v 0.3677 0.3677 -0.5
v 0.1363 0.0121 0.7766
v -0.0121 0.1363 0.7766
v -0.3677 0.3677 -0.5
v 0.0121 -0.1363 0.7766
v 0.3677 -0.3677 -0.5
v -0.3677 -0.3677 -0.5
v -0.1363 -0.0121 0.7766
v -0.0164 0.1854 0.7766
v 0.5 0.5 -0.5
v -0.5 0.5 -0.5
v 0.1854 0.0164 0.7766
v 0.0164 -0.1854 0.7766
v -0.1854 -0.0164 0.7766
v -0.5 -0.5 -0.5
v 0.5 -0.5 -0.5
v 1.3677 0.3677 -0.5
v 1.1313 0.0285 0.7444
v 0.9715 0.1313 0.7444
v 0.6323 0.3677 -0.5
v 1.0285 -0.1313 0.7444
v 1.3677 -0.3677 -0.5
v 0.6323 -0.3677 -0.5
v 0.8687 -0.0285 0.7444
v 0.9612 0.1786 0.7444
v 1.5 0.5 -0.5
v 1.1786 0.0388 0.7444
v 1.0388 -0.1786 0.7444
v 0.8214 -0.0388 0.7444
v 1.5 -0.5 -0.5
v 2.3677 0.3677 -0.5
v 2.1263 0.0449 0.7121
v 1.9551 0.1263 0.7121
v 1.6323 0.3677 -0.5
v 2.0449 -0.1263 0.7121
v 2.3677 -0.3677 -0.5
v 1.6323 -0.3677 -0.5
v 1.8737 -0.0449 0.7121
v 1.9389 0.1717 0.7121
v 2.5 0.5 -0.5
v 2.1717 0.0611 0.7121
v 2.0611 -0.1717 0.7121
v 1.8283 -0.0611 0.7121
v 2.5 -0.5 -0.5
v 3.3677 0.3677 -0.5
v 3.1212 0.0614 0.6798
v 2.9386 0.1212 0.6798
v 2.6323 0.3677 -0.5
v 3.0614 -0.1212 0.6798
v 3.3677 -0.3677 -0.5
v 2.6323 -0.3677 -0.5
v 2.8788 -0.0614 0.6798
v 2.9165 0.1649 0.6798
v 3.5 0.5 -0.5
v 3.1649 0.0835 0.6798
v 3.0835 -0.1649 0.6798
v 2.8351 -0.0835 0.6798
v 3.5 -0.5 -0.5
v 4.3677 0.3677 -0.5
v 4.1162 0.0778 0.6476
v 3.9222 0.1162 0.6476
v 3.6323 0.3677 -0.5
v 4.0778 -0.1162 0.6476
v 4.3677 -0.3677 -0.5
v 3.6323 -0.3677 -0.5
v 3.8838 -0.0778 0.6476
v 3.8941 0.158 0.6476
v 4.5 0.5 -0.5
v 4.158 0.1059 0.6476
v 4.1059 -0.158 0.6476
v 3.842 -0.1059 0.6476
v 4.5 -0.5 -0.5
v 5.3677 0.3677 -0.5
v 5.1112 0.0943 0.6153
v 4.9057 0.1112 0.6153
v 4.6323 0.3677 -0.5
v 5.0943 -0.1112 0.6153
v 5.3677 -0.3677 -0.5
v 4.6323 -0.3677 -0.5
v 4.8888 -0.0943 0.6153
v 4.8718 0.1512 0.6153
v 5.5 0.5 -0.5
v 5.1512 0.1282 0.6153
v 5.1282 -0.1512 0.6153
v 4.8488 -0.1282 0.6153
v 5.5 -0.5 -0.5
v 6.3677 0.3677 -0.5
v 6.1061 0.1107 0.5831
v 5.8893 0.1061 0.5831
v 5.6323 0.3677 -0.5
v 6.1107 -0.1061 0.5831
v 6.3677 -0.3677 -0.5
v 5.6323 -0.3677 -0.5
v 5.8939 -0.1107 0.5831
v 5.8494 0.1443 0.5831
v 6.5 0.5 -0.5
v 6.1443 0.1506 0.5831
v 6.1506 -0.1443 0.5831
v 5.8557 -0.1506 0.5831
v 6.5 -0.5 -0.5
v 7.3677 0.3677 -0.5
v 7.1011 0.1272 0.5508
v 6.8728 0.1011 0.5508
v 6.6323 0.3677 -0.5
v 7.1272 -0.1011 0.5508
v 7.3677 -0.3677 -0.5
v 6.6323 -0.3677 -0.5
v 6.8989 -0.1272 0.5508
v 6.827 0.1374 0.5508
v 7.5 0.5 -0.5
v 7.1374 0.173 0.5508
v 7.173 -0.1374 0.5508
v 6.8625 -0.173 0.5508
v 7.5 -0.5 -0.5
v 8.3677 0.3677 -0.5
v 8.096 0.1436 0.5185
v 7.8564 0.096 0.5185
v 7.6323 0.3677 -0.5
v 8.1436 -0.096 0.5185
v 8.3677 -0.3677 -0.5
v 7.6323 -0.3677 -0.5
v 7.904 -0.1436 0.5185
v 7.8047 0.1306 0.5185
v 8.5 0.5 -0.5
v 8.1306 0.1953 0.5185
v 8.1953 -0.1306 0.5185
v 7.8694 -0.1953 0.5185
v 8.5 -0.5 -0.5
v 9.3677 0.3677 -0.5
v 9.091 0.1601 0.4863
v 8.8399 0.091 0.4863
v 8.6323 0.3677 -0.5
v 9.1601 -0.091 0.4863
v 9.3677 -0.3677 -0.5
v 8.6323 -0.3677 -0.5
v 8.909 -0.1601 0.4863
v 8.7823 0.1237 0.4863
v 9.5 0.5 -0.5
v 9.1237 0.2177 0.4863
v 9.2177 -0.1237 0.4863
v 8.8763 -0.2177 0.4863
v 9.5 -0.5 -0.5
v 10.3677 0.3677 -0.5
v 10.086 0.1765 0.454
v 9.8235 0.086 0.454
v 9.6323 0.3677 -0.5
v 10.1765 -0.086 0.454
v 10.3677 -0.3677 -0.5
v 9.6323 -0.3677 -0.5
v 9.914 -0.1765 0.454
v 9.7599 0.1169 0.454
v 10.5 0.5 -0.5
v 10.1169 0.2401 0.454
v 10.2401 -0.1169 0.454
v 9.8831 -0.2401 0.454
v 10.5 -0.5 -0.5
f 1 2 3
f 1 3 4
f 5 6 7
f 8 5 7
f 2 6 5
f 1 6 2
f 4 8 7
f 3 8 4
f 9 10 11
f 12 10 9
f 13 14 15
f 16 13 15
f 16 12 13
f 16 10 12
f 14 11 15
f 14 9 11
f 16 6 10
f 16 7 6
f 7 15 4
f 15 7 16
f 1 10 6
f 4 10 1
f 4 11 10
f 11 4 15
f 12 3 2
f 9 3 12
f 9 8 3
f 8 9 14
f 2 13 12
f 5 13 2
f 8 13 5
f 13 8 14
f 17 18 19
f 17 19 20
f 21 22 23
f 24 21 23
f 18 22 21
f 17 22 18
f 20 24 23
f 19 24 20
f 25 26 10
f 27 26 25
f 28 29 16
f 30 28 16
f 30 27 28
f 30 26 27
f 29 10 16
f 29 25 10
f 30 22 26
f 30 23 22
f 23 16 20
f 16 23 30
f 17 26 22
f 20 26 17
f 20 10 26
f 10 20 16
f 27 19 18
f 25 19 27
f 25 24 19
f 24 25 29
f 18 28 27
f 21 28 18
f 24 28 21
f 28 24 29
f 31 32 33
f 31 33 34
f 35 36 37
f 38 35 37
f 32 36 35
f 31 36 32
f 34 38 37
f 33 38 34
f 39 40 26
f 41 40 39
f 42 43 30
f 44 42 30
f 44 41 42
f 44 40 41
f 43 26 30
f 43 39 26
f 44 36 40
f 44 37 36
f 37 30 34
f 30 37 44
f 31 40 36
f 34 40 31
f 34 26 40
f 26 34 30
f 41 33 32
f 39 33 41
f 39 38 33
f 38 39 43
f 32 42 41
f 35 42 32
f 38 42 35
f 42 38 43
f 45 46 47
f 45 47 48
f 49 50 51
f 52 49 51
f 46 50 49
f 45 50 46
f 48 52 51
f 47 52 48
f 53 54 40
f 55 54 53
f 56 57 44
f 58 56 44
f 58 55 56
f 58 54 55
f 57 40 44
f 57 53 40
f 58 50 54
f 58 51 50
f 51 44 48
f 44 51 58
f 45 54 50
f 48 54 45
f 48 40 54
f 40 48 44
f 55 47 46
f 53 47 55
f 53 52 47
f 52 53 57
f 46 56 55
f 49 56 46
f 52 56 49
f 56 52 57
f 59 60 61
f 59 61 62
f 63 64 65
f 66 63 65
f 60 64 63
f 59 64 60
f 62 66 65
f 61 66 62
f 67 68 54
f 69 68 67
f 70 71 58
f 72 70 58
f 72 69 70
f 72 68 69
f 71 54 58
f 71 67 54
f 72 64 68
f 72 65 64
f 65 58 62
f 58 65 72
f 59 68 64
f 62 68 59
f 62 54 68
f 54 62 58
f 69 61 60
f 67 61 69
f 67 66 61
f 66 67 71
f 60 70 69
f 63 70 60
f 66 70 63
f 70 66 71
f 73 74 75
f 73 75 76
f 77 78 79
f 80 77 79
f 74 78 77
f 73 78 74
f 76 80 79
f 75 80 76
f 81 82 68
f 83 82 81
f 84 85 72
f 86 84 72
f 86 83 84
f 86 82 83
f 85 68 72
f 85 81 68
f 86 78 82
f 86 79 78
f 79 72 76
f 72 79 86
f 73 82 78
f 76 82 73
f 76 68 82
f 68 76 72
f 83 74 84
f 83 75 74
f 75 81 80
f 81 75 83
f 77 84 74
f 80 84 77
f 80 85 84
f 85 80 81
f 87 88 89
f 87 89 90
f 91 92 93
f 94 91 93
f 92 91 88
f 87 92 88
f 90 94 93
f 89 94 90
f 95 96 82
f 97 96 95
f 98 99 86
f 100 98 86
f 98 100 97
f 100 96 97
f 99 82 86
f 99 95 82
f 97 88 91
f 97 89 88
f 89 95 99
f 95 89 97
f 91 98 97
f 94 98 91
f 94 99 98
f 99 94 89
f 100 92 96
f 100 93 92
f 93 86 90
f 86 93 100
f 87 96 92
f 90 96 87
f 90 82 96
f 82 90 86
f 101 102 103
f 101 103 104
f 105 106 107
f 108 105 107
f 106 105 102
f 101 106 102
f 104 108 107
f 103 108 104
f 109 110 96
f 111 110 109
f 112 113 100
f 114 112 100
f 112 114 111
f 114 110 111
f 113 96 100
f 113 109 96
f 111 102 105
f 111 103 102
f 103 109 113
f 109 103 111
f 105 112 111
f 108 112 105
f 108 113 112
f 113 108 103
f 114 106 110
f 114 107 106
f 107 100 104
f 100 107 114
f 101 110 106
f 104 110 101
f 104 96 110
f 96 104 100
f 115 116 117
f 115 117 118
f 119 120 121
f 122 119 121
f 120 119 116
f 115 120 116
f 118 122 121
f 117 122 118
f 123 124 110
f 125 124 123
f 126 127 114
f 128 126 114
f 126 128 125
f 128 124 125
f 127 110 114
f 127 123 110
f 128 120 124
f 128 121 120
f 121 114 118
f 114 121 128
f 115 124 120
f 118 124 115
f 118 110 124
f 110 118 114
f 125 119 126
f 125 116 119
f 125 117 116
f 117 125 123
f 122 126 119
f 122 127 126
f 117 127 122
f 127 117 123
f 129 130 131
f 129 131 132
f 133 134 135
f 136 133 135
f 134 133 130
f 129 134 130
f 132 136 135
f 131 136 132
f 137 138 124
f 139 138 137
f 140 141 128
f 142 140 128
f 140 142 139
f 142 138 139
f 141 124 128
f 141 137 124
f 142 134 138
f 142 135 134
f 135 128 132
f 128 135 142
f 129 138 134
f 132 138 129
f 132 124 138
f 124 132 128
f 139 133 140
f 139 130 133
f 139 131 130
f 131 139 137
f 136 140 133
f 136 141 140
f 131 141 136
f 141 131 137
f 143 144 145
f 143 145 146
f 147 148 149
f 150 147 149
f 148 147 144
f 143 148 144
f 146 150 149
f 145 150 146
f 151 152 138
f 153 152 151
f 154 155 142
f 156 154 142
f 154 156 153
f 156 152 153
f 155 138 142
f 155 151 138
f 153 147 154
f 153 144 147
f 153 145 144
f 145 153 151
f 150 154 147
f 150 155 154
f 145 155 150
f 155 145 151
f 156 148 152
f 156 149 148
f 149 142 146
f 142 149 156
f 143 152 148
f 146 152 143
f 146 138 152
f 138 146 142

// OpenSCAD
//Start with Dimensions
pvalue = 20; // [10.0:20.0]
/* [Hidden] */

points_01 = [[-0.048376, -0.463729, 0.131425], [0.463729, -0.048376, 0.131425], [-0.463729, 0.048376, 0.131425], [0.048376, 0.463729, 0.131425], [-0.5, 0.5, -0.5], [0.5, 0.5, -0.5], [-0.5, -0.5, -0.5], [0.5, -0.5, -0.5], [-0.341008, 0.035574, 0.131425], [0.035574, 0.341008, 0.131425], [0.36768, 0.36768, -0.5], [-0.36768, 0.36768, -0.5], [-0.36768, -0.36768, -0.5], [0.36768, -0.36768, -0.5], [0.341008, -0.035574, 0.131425], [-0.035574, -0.341008, 0.131425]];
triangles_01 = [[8, 9, 11], [11, 9, 10], [12, 13, 15], [15, 13, 14], [13, 10, 14], [14, 10, 9], [15, 8, 12], [12, 8, 11], [2, 4, 3], [3, 4, 5], [6, 0, 7], [7, 0, 1], [3, 5, 1], [1, 5, 7], [4, 2, 6], [6, 2, 0], [2, 3, 8], [8, 3, 9], [5, 4, 10], [10, 4, 11], [6, 7, 12], [12, 7, 13], [1, 0, 14], [14, 0, 15], [7, 5, 13], [13, 5, 10], [3, 1, 9], [9, 1, 14], [0, 2, 15], [15, 2, 8], [4, 6, 11], [11, 6, 12]];

points_02 = [[-0.185412, -0.01639, 0.776613], [0.01639, -0.185412, 0.776613], [-0.01639, 0.185412, 0.776613], [0.185412, 0.01639, 0.776613], [-0.5, 0.5, -0.5], [0.5, 0.5, -0.5], [-0.5, -0.5, -0.5], [0.5, -0.5, -0.5], [-0.012052, 0.136344, 0.776613], [0.136344, 0.012052, 0.776613], [0.36768, 0.36768, -0.5], [-0.36768, 0.36768, -0.5], [-0.36768, -0.36768, -0.5], [0.36768, -0.36768, -0.5], [0.012052, -0.136344, 0.776613], [-0.136344, -0.012052, 0.776613]];
triangles_02 = [[9, 10, 8], [8, 10, 11], [13, 14, 12], [12, 14, 15], [14, 13, 9], [9, 13, 10], [12, 15, 11], [11, 15, 8], [4, 5, 2], [2, 5, 3], [0, 1, 6], [6, 1, 7], [1, 3, 7], [7, 3, 5], [6, 4, 0], [0, 4, 2], [2, 3, 8], [8, 3, 9], [5, 4, 10], [10, 4, 11], [6, 7, 12], [12, 7, 13], [1, 0, 14], [14, 0, 15], [7, 5, 13], [13, 5, 10], [3, 1, 9], [9, 1, 14], [0, 2, 15], [15, 2, 8], [4, 6, 11], [11, 6, 12]];

vectors = points_01 - points_02;

for (i = [0:10]){
translate([i, 0, 0])
polyhedron(points=points_02+vectors*(i/pvalue), triangles=triangles_02);
}
